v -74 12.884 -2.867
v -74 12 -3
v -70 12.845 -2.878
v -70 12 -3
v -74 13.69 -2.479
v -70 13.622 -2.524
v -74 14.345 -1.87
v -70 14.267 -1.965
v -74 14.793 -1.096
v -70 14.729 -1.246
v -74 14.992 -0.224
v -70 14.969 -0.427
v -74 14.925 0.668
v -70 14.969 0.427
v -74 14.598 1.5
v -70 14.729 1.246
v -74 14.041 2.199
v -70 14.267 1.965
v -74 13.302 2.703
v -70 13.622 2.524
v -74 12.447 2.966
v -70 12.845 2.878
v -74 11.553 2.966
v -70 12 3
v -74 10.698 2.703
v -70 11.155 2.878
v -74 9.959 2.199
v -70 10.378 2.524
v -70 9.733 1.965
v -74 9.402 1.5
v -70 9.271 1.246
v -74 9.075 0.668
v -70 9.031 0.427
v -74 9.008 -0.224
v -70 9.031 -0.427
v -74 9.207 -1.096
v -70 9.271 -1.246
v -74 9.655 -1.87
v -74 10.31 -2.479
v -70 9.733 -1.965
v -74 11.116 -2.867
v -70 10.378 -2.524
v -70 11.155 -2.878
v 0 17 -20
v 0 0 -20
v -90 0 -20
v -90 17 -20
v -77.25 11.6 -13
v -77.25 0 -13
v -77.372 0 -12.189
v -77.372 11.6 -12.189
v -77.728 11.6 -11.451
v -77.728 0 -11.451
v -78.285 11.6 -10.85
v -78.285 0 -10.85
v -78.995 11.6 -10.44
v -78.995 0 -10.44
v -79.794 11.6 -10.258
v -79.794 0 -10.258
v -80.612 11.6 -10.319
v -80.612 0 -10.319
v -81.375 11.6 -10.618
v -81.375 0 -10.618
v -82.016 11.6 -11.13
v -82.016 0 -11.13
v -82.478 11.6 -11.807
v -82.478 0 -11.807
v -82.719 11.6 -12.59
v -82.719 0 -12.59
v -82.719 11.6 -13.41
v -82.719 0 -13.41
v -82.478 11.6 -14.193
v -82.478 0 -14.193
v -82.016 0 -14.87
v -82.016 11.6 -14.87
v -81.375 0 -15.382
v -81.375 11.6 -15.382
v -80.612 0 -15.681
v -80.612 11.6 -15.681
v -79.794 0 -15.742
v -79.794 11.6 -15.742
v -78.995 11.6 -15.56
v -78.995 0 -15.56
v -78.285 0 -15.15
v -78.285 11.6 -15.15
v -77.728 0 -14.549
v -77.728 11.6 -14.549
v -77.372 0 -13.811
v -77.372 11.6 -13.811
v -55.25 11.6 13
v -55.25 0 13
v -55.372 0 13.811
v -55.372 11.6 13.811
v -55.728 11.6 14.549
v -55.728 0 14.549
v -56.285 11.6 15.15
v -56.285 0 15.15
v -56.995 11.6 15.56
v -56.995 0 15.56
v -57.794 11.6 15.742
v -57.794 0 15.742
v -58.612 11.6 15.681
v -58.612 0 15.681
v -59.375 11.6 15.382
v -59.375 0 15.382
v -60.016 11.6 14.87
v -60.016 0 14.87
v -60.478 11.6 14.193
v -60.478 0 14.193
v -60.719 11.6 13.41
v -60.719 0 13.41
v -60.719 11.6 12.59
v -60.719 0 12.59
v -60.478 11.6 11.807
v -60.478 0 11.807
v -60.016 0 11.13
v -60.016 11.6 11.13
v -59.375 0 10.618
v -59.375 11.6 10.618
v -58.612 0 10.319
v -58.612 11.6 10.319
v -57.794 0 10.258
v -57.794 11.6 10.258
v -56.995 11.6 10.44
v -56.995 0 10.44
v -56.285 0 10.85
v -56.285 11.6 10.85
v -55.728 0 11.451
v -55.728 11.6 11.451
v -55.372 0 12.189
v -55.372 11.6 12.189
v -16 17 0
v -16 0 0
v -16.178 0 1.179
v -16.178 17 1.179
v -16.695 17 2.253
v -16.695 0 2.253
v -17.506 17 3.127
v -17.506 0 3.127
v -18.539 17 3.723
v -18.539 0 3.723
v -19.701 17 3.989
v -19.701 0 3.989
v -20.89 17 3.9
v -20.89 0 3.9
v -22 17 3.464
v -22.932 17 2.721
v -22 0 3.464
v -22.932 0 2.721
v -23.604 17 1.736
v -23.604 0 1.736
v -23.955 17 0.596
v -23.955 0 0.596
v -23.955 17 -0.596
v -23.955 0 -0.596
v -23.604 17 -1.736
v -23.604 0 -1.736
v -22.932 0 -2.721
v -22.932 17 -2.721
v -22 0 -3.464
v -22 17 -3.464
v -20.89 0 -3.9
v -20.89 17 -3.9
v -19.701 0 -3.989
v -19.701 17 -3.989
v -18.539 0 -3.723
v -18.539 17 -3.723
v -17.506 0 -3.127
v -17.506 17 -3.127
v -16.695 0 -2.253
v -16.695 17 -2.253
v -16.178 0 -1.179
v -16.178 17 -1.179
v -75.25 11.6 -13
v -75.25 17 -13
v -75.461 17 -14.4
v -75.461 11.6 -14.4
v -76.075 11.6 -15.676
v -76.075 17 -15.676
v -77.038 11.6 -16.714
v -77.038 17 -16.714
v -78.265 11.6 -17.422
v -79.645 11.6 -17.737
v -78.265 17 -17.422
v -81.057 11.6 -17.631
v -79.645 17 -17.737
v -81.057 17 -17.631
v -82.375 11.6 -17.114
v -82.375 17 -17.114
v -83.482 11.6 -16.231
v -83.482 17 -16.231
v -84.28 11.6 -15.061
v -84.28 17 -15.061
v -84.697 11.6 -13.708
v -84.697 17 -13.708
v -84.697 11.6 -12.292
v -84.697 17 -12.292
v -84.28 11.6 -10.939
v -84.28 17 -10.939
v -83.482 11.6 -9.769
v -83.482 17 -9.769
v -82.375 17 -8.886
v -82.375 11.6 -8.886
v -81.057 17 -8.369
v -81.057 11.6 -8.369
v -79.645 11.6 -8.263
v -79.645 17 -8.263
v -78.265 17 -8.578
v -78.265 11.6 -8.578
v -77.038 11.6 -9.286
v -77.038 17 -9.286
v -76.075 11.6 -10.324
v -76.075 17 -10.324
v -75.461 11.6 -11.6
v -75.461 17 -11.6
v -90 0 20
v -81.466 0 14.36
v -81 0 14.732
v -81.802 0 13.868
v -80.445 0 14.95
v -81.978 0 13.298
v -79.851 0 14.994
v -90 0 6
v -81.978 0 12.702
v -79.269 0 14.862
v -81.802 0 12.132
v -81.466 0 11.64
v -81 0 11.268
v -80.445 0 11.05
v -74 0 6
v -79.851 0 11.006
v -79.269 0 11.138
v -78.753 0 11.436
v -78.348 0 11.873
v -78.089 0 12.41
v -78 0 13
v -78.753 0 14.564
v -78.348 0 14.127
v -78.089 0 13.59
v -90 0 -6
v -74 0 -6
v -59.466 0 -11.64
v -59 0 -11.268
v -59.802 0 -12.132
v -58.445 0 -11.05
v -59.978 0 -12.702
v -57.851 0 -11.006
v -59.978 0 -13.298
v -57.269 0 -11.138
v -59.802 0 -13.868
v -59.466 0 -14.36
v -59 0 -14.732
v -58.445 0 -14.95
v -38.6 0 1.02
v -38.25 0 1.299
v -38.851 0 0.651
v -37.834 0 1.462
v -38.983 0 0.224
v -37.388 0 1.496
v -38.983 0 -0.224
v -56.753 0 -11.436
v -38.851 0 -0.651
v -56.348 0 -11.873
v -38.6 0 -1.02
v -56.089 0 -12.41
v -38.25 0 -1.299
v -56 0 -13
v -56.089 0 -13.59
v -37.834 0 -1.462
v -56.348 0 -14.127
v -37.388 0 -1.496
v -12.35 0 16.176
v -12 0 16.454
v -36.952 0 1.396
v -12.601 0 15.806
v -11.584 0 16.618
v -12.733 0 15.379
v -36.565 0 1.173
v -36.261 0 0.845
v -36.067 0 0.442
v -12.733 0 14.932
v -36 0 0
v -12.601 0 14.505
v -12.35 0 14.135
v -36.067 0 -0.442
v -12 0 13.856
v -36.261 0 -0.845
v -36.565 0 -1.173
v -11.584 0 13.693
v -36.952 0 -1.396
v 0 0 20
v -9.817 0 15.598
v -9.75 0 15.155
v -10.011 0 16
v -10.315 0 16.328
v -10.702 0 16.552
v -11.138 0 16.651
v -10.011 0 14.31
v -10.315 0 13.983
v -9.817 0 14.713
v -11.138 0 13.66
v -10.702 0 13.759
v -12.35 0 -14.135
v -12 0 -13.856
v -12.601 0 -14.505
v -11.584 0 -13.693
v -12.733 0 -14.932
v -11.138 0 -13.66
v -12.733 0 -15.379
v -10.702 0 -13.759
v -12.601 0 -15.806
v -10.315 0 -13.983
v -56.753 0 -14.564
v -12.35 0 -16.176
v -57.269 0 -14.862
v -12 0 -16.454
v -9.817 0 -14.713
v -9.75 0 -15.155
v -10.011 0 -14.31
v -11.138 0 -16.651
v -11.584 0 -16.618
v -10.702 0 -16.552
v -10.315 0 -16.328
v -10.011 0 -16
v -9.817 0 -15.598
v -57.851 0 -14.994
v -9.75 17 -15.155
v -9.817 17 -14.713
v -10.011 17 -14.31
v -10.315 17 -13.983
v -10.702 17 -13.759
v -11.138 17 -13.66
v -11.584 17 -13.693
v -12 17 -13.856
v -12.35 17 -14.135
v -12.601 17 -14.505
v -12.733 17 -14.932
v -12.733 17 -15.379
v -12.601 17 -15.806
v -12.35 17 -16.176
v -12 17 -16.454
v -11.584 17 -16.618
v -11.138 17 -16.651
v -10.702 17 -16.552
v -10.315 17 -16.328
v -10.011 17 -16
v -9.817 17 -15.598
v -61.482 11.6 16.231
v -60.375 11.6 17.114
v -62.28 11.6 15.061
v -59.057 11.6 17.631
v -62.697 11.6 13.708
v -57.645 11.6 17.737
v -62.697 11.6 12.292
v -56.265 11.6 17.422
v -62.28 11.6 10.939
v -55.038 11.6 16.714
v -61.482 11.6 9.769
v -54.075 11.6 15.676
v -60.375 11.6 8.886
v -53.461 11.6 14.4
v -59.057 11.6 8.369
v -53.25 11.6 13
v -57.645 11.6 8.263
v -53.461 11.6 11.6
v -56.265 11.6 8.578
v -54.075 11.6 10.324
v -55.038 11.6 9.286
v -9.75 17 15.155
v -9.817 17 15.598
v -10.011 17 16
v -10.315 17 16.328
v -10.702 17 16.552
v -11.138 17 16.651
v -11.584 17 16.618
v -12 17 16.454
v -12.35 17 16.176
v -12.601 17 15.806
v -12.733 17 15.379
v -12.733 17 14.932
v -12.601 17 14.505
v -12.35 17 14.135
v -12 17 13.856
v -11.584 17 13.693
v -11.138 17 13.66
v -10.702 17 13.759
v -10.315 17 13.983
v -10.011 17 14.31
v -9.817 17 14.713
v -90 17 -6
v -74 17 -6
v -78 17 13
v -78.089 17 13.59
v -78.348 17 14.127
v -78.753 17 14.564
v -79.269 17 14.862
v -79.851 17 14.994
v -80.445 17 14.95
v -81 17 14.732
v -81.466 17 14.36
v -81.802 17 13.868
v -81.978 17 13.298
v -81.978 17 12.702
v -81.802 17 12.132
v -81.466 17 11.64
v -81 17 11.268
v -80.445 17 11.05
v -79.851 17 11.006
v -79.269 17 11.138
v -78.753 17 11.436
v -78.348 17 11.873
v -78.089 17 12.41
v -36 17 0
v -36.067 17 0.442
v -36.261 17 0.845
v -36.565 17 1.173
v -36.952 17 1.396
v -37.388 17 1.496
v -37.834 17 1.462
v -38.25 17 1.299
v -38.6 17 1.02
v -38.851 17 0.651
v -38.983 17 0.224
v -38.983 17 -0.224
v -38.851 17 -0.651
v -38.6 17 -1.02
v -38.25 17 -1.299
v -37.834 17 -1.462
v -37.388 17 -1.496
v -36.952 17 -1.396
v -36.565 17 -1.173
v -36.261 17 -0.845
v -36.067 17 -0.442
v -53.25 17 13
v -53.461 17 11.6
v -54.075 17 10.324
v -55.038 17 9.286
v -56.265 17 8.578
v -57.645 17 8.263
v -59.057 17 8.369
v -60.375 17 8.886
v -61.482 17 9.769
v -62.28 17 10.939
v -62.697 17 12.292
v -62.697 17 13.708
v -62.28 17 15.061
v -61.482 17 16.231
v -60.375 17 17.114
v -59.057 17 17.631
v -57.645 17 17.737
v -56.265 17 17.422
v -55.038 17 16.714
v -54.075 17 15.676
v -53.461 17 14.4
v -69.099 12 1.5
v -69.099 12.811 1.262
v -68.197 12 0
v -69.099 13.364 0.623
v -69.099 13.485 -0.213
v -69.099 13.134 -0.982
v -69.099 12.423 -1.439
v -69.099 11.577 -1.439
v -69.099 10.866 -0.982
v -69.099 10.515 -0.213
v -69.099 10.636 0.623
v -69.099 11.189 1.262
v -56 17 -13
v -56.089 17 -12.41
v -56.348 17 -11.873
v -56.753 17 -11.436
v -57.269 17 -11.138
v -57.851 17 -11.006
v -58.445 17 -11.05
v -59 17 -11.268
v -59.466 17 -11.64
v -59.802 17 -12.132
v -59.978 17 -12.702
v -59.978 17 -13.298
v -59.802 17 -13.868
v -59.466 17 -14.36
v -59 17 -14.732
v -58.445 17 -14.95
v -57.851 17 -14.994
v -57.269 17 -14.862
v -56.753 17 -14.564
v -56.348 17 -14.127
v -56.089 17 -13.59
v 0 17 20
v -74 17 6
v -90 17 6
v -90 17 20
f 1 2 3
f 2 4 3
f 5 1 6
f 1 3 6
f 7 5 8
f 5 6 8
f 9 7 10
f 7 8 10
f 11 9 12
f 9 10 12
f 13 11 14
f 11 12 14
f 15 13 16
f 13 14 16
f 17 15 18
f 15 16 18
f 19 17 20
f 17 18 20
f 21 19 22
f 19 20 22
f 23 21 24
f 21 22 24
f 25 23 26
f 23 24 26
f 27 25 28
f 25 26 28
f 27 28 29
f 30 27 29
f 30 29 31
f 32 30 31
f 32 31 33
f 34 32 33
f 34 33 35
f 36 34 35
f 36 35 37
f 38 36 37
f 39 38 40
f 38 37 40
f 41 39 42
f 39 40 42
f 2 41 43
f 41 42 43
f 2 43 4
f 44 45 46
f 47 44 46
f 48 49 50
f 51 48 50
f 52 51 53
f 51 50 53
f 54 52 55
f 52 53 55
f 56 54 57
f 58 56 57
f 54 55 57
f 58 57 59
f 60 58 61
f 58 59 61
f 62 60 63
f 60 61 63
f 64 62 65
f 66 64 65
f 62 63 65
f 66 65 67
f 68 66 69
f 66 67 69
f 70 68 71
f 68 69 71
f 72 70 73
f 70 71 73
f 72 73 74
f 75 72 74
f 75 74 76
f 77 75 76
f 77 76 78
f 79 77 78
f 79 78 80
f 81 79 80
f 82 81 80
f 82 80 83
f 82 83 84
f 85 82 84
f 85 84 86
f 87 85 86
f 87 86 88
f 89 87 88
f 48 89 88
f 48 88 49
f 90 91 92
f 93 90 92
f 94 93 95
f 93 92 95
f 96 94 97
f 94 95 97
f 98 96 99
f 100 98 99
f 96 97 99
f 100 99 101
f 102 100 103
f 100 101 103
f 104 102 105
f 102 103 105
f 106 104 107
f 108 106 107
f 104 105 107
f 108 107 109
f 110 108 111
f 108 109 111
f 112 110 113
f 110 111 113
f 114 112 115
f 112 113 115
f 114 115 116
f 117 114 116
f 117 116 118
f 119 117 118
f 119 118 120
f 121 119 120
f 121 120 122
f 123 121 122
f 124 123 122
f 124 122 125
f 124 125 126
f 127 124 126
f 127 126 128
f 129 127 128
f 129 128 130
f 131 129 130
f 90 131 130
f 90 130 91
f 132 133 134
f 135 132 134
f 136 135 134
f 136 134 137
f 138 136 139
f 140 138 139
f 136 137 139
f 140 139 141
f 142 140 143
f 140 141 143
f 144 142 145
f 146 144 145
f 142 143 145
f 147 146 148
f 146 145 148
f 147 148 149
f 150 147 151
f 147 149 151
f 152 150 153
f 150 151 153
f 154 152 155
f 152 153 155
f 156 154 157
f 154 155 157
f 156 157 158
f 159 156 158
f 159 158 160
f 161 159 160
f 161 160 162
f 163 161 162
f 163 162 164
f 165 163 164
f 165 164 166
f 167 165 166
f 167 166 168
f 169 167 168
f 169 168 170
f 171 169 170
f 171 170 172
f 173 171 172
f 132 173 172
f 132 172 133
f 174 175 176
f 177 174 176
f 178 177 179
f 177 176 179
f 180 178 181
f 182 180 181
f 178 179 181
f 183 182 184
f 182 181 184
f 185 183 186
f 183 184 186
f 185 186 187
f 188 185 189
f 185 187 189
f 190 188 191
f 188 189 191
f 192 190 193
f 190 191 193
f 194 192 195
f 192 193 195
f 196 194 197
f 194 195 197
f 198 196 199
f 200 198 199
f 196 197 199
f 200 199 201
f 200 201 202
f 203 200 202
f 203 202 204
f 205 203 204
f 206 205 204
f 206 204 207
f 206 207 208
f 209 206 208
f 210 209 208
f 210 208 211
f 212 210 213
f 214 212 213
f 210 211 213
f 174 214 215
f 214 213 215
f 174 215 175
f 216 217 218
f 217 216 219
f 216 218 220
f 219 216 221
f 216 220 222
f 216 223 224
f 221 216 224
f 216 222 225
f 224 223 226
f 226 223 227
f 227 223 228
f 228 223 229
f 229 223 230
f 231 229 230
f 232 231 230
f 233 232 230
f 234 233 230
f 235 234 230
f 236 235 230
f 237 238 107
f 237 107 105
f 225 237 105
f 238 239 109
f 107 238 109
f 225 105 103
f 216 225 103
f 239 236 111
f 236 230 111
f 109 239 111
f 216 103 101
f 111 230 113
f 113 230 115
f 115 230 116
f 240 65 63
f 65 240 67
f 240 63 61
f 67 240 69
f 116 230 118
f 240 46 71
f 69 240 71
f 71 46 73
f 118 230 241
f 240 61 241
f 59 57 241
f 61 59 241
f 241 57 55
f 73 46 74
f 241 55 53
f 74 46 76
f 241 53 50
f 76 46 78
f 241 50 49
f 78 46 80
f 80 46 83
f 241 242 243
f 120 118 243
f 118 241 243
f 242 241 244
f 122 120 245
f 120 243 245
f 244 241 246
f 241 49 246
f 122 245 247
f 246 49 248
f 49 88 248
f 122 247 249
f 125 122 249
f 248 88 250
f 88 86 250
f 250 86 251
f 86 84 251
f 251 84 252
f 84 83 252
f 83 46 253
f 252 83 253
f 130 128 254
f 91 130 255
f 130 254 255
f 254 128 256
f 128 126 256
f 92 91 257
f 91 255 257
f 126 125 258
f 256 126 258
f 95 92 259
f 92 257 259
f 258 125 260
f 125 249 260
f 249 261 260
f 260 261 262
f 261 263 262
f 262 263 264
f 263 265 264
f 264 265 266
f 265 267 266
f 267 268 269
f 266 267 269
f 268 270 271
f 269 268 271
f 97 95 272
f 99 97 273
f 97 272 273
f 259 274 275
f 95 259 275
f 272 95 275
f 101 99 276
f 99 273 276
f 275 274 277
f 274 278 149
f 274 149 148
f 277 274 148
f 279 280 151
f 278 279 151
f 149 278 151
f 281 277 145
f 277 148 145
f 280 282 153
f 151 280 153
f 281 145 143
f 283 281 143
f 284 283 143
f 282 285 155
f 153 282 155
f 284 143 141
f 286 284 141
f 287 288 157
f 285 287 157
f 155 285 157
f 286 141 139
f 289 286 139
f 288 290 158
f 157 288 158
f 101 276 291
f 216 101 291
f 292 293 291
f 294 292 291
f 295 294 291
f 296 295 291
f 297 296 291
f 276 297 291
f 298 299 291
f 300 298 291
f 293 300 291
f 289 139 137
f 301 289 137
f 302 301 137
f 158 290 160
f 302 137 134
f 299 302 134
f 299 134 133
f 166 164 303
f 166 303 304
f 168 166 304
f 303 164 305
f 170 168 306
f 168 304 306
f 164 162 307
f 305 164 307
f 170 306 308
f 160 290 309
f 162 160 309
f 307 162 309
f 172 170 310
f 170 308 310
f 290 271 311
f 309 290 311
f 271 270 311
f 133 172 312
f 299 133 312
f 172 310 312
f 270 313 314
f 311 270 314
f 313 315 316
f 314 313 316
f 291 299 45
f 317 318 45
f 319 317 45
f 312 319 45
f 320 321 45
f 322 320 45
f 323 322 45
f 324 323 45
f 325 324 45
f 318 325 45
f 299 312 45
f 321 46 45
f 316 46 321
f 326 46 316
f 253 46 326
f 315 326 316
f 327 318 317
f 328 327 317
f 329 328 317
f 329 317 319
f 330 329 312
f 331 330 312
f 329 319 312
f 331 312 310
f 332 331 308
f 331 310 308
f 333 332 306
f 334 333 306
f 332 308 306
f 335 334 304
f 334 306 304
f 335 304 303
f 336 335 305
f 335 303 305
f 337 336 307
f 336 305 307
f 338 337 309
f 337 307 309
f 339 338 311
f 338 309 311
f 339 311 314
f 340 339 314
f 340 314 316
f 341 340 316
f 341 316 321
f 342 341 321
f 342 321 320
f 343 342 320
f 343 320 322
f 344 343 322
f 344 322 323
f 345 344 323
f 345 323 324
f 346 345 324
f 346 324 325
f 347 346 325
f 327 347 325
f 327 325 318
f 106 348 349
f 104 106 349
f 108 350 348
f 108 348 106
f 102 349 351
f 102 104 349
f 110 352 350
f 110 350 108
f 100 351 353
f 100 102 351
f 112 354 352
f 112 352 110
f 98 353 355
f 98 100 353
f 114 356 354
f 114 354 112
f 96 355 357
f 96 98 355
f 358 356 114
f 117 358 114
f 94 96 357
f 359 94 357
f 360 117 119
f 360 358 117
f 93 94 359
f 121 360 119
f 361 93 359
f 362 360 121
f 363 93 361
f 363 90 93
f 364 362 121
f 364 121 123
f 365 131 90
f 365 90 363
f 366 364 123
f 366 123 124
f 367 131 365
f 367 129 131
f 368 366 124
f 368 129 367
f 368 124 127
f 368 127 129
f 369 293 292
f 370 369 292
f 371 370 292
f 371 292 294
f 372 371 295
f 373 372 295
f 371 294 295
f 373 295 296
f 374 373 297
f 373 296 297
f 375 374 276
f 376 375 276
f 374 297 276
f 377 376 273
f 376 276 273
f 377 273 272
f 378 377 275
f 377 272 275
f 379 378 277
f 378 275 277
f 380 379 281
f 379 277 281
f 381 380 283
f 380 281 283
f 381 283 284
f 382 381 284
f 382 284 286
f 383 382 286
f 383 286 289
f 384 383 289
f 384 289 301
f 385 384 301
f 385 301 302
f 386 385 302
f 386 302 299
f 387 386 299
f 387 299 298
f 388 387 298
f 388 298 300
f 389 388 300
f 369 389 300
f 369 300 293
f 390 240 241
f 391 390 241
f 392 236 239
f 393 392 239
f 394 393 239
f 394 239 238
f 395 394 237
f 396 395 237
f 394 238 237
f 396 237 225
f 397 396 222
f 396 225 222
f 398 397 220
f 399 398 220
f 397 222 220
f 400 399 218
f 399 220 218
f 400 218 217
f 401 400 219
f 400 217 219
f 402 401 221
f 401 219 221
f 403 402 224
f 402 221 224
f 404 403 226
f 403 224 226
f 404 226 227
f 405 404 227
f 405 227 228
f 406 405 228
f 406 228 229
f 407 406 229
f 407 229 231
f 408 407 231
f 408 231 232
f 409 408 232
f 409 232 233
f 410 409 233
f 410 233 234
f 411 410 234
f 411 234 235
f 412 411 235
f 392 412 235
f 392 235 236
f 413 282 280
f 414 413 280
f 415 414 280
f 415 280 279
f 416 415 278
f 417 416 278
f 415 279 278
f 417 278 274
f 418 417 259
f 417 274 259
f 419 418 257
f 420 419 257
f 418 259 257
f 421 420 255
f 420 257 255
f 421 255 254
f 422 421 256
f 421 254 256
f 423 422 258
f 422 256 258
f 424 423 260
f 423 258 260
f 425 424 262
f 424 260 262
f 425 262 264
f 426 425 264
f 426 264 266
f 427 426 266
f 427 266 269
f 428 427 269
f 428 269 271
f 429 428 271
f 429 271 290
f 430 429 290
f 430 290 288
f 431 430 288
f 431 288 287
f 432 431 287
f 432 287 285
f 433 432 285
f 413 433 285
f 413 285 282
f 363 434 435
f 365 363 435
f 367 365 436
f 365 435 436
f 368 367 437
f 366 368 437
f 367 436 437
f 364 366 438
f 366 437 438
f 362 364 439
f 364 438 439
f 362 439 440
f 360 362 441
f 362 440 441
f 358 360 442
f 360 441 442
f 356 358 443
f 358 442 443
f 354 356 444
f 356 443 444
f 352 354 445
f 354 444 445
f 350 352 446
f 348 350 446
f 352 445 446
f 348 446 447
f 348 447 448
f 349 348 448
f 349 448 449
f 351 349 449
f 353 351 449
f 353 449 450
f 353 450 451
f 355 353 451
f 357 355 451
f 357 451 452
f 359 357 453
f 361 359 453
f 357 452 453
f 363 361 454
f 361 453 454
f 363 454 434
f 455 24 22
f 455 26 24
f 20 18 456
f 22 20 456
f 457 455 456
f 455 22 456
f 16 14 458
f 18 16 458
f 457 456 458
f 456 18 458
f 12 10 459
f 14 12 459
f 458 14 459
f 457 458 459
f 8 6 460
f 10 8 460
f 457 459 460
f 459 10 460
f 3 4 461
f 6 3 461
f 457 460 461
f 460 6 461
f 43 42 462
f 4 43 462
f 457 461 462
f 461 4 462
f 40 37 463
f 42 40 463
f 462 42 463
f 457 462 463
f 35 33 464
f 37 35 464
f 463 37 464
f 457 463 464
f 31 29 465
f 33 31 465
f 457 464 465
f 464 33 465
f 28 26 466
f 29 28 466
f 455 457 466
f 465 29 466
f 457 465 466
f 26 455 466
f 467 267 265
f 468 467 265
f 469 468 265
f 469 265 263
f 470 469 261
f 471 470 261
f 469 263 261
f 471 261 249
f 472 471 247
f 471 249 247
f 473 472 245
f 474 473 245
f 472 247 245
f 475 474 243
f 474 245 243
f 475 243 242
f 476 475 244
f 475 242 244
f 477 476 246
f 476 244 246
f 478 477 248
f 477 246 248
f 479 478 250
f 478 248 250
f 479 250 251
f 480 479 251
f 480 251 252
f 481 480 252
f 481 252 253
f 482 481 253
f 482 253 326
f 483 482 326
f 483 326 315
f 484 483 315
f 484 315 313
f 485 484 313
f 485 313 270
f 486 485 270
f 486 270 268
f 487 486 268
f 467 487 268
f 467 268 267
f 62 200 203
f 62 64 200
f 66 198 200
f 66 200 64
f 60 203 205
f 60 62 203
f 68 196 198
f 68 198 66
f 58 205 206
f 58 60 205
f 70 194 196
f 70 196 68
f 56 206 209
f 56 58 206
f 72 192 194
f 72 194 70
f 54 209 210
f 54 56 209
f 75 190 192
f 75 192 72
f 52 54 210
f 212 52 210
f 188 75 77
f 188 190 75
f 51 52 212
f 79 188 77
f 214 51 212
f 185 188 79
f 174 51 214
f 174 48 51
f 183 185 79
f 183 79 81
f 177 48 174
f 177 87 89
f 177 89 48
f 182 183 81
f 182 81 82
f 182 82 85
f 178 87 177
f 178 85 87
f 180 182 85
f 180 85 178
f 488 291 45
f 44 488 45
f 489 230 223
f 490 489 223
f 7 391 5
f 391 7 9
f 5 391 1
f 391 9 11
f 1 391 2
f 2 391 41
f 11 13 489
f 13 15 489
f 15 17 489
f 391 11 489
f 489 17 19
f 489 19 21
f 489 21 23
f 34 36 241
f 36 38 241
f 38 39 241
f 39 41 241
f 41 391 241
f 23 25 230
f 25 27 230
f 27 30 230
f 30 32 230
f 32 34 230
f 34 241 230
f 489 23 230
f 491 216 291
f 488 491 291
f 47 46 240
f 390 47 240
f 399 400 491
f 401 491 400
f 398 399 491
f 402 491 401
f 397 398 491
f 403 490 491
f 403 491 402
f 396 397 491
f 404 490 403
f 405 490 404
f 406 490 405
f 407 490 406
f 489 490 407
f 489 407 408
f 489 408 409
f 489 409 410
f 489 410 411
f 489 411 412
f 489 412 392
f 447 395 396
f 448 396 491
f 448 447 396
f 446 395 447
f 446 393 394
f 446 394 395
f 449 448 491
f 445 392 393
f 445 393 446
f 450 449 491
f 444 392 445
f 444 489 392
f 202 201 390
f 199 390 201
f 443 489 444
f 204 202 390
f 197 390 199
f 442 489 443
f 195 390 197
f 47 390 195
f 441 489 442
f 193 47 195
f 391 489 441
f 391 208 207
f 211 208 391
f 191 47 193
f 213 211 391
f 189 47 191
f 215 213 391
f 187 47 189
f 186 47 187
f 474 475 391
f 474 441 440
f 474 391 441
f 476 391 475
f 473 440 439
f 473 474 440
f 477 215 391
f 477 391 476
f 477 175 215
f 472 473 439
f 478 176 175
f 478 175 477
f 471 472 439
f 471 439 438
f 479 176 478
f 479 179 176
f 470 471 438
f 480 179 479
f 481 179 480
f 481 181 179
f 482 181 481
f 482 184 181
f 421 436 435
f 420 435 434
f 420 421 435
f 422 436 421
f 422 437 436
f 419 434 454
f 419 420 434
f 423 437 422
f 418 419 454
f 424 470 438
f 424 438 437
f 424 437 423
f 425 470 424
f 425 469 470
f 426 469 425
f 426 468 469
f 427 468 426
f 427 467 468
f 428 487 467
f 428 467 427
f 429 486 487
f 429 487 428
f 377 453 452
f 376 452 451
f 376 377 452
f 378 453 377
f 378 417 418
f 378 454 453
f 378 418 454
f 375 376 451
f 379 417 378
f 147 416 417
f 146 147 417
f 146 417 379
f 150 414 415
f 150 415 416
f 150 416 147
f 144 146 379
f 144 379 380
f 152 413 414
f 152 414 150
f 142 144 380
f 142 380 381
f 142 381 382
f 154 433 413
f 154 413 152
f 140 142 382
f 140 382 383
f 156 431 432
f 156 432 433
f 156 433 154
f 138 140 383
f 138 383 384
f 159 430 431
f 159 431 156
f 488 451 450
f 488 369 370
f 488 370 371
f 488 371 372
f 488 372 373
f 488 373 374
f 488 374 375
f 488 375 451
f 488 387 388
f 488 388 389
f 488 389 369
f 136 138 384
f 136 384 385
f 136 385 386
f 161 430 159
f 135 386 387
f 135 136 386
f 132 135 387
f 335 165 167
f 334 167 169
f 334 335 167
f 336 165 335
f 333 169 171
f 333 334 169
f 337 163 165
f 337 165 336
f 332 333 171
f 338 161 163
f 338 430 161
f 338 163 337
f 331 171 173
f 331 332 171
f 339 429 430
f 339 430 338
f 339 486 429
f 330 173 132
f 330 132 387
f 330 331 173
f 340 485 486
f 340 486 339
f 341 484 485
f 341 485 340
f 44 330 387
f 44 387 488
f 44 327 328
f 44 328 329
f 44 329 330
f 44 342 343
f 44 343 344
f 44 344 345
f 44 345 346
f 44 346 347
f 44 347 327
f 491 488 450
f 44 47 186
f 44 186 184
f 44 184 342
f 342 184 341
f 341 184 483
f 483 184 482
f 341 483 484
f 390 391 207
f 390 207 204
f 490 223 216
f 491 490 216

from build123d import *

# Parameters (mm, degrees)
EXTRUDE_1_DEPTH        = 17
SKETCH_4_R             = 2.75
SKETCH_4_R_2           = 2
SKETCH_4_R_3           = 4
SKETCH_4_R_4           = 1.5
CUT_EXTRUDE_2_DEPTH    = 18
SKETCH_5_R             = 4.75
CUT_EXTRUDE_3_DEPTH    = 5.4
HOLE_WIZARD_M4_1_D     = 6
HOLE_WIZARD_M4_1_DEPTH = 4
HOLE_WIZARD_M4_1_TIP   = 1.802581857


with BuildPart() as part:
    # 스케치1 → 보스-돌출1 (new body)
    with BuildSketch(Plane(origin=(0, 0, 0), x_dir=(1, 0, 0), z_dir=(0, 1, 0))):
        Polygon((-90, -6), (-90, -20), (0, -20), (0, 20), (-90, 20), (-90, 6), (-74, 6), (-74, -6), align=None)
    extrude(amount=EXTRUDE_1_DEPTH)

    # 스케치4 → 컷-돌출2 (cut, through all)
    with BuildSketch(Plane.XZ):
        with Locations((-80, -13)):
            Circle(SKETCH_4_R)
        with Locations((-80, 13)):
            Circle(SKETCH_4_R_2)
        with Locations((-58, 13)):
            Circle(SKETCH_4_R)
        with Locations((-58, -13)):
            Circle(SKETCH_4_R_2)
        with Locations((-20, 0)):
            Circle(SKETCH_4_R_3)
        with Locations((-11.25, 15.155444566)):
            Circle(SKETCH_4_R_4)
        with Locations((-11.25, -15.155444566)):
            Circle(SKETCH_4_R_4)
        with Locations((-37.5, 0)):
            Circle(SKETCH_4_R_4)
    extrude(amount=-CUT_EXTRUDE_2_DEPTH, mode=Mode.SUBTRACT)

    # 스케치5 → 컷-돌출3 (cut)
    with BuildSketch(Plane(origin=(0, 17, 0), x_dir=(1, 0, 0), z_dir=(0, 1, 0))):
        with Locations((-80, 13)):
            Circle(SKETCH_5_R)
        with Locations((-58, -13)):
            Circle(SKETCH_5_R)
    extrude(amount=-CUT_EXTRUDE_3_DEPTH, mode=Mode.SUBTRACT)

    # M4 여유 구멍1
    with Locations(Plane.ZY.offset(74)):
        with Locations((0, 12)):
            Hole(HOLE_WIZARD_M4_1_D / 2, depth=HOLE_WIZARD_M4_1_DEPTH)
            with Locations((0, 0, -(HOLE_WIZARD_M4_1_DEPTH + HOLE_WIZARD_M4_1_TIP / 2))):  # 118° drill point
                Cone(0, HOLE_WIZARD_M4_1_D / 2, HOLE_WIZARD_M4_1_TIP, mode=Mode.SUBTRACT)


solid = part.part
